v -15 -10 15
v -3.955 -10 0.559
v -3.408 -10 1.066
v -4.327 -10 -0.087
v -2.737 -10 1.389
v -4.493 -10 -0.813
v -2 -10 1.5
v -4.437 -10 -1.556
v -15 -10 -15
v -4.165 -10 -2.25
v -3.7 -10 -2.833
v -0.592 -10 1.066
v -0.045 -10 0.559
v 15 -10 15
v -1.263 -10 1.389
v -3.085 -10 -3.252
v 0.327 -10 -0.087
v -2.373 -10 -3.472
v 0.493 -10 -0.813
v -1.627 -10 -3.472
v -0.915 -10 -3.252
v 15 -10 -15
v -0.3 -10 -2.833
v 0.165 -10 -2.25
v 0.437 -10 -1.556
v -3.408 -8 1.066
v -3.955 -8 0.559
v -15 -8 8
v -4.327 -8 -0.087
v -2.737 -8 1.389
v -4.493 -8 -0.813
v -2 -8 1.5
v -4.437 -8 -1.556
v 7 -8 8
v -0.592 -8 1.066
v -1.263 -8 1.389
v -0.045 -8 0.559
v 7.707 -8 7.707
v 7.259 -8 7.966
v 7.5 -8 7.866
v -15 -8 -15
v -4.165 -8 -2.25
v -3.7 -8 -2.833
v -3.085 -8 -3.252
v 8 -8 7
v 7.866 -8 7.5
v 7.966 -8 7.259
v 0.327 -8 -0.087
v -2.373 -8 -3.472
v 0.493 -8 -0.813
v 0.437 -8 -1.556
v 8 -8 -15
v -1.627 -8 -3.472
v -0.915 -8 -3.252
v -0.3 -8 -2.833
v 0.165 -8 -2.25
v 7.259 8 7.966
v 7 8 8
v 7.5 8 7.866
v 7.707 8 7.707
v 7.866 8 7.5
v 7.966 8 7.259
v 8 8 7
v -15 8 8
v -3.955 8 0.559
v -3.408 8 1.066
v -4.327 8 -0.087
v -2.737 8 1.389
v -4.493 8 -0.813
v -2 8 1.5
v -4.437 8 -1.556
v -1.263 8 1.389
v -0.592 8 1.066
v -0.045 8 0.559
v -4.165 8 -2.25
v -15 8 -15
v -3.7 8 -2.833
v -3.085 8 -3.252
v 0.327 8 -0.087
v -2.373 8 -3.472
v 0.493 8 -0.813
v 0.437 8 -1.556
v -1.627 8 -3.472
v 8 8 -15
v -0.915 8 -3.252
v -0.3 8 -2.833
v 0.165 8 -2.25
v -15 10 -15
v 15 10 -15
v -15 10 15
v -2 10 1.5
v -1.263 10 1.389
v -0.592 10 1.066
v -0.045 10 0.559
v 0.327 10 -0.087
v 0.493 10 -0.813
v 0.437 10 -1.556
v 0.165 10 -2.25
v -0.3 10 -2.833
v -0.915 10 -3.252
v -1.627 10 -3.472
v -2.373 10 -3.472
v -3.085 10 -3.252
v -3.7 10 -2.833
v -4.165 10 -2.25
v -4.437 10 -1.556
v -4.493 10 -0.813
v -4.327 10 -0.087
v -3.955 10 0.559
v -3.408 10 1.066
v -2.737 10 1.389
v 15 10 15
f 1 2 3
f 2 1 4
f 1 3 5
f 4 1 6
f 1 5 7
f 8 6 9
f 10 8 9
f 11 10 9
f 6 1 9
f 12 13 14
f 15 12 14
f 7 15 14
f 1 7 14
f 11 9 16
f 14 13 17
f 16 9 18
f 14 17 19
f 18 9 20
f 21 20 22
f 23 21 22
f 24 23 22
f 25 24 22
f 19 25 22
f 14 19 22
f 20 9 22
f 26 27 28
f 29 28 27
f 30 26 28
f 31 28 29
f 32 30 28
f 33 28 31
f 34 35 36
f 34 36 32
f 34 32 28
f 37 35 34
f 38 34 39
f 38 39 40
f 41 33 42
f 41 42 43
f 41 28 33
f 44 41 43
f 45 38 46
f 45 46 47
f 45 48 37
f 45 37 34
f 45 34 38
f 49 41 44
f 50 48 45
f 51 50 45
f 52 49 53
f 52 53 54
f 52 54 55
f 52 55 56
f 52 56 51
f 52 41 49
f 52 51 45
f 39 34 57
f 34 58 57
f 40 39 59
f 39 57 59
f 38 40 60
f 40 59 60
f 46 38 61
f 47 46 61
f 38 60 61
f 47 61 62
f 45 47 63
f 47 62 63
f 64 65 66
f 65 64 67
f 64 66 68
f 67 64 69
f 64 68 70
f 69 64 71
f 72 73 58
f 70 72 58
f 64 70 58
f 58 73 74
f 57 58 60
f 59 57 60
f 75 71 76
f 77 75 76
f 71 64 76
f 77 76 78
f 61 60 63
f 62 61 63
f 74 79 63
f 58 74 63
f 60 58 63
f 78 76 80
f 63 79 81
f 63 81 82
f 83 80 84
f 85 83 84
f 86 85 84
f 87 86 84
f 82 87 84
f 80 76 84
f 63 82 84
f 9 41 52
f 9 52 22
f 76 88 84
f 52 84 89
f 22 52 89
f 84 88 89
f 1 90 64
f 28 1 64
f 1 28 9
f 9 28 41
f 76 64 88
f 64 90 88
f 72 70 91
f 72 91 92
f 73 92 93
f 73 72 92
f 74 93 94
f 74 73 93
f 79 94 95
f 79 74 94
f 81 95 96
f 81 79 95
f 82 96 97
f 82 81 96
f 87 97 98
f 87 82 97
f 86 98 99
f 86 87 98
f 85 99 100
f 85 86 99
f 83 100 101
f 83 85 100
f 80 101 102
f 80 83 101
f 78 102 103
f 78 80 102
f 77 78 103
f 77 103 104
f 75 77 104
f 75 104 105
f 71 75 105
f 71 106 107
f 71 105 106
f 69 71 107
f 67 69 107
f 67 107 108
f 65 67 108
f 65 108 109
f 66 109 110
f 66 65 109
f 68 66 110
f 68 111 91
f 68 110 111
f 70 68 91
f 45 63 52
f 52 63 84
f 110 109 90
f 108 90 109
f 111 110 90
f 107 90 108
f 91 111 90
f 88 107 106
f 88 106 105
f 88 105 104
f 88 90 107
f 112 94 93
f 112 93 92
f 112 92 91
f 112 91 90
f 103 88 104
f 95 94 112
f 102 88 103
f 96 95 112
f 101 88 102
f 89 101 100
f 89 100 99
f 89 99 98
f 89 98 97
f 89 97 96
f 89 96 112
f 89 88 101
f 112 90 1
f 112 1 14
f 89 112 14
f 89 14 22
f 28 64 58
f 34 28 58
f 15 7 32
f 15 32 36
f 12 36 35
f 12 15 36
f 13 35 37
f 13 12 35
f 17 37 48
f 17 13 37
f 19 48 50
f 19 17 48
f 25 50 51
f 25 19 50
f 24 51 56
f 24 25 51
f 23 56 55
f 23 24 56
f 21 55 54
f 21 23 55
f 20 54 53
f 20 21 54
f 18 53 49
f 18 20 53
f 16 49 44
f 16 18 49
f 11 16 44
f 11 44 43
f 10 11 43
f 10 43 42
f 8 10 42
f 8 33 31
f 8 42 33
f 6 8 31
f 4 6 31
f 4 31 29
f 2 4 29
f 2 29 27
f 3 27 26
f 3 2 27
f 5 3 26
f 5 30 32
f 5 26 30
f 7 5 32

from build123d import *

# Parameters (mm, degrees)
SKETCH1_W               = 30
SKETCH1_H               = 30
BOSS_EXTRUDE1_DEPTH     = 10
SKETCH2_W               = 31
SKETCH2_H               = 31
SKETCH2_W_2             = 15
SKETCH2_H_2             = 15
CUT_EXTRUDE1_DEPTH      = 8
FILLET1_R               = 1
CUT_EXTRUDE2_DEPTH      = 28.820855486
CUT_EXTRUDE2_DEPTH_BACK = 28.820855486
SKETCH3_R               = 2.5


with BuildPart() as part:
    # Sketch1 → Boss-Extrude1 (new, symmetric)
    with BuildSketch(Plane(origin=(0, 0, 0), x_dir=(1, 0, 0), z_dir=(0, 1, 0))):
        Rectangle(SKETCH1_W, SKETCH1_H)
    extrude(amount=BOSS_EXTRUDE1_DEPTH, both=True)

    # Sketch2 → Cut-Extrude1 (cut, symmetric)
    # profile 1 of 3: a face of its own
    with BuildSketch(Plane(origin=(0, 0, 0), x_dir=(1, 0, 0), z_dir=(0, 1, 0))):
        with Locations((-7.5, 7.5)):
            Rectangle(SKETCH2_W, SKETCH2_H)
        with Locations((-7.5, 7.5)):
            Rectangle(SKETCH2_W_2, SKETCH2_H_2, mode=Mode.SUBTRACT)
    # profile 2 of 3: a face of its own
    with BuildSketch(Plane(origin=(0, 0, 0), x_dir=(1, 0, 0), z_dir=(0, 1, 0))):
        with Locations((-7.5, 7.5)):
            Rectangle(SKETCH2_W, SKETCH2_H)
        with Locations((-7.5, 7.5)):
            Rectangle(SKETCH2_W_2, SKETCH2_H_2, mode=Mode.SUBTRACT)
    # profile 3 of 3: a face of its own
    with BuildSketch(Plane(origin=(0, 0, 0), x_dir=(1, 0, 0), z_dir=(0, 1, 0))):
        with Locations((-7.5, 7.5)):
            Rectangle(SKETCH2_W_2, SKETCH2_H_2)
    extrude(amount=CUT_EXTRUDE1_DEPTH, both=True, mode=Mode.SUBTRACT)

    # Fillet1
    fillet1_edges = [part.edges().sort_by_distance(p)[0] for p in [
        (8, 0, 8),
    ]]
    fillet(fillet1_edges, radius=FILLET1_R)

    # Sketch3 → Cut-Extrude2 (cut, two sides: drawn at the far end of the back side and taken through both)
    with BuildSketch(Plane(origin=(0, -8, 0), x_dir=(1, 0, 0), z_dir=(0, 1, 0)).offset(-CUT_EXTRUDE2_DEPTH_BACK)):
        with Locations(Location((-2, 1, 0), (0, 0, 270))):
            Circle(SKETCH3_R)
    extrude(amount=CUT_EXTRUDE2_DEPTH + CUT_EXTRUDE2_DEPTH_BACK, mode=Mode.SUBTRACT)


solid = part.part
